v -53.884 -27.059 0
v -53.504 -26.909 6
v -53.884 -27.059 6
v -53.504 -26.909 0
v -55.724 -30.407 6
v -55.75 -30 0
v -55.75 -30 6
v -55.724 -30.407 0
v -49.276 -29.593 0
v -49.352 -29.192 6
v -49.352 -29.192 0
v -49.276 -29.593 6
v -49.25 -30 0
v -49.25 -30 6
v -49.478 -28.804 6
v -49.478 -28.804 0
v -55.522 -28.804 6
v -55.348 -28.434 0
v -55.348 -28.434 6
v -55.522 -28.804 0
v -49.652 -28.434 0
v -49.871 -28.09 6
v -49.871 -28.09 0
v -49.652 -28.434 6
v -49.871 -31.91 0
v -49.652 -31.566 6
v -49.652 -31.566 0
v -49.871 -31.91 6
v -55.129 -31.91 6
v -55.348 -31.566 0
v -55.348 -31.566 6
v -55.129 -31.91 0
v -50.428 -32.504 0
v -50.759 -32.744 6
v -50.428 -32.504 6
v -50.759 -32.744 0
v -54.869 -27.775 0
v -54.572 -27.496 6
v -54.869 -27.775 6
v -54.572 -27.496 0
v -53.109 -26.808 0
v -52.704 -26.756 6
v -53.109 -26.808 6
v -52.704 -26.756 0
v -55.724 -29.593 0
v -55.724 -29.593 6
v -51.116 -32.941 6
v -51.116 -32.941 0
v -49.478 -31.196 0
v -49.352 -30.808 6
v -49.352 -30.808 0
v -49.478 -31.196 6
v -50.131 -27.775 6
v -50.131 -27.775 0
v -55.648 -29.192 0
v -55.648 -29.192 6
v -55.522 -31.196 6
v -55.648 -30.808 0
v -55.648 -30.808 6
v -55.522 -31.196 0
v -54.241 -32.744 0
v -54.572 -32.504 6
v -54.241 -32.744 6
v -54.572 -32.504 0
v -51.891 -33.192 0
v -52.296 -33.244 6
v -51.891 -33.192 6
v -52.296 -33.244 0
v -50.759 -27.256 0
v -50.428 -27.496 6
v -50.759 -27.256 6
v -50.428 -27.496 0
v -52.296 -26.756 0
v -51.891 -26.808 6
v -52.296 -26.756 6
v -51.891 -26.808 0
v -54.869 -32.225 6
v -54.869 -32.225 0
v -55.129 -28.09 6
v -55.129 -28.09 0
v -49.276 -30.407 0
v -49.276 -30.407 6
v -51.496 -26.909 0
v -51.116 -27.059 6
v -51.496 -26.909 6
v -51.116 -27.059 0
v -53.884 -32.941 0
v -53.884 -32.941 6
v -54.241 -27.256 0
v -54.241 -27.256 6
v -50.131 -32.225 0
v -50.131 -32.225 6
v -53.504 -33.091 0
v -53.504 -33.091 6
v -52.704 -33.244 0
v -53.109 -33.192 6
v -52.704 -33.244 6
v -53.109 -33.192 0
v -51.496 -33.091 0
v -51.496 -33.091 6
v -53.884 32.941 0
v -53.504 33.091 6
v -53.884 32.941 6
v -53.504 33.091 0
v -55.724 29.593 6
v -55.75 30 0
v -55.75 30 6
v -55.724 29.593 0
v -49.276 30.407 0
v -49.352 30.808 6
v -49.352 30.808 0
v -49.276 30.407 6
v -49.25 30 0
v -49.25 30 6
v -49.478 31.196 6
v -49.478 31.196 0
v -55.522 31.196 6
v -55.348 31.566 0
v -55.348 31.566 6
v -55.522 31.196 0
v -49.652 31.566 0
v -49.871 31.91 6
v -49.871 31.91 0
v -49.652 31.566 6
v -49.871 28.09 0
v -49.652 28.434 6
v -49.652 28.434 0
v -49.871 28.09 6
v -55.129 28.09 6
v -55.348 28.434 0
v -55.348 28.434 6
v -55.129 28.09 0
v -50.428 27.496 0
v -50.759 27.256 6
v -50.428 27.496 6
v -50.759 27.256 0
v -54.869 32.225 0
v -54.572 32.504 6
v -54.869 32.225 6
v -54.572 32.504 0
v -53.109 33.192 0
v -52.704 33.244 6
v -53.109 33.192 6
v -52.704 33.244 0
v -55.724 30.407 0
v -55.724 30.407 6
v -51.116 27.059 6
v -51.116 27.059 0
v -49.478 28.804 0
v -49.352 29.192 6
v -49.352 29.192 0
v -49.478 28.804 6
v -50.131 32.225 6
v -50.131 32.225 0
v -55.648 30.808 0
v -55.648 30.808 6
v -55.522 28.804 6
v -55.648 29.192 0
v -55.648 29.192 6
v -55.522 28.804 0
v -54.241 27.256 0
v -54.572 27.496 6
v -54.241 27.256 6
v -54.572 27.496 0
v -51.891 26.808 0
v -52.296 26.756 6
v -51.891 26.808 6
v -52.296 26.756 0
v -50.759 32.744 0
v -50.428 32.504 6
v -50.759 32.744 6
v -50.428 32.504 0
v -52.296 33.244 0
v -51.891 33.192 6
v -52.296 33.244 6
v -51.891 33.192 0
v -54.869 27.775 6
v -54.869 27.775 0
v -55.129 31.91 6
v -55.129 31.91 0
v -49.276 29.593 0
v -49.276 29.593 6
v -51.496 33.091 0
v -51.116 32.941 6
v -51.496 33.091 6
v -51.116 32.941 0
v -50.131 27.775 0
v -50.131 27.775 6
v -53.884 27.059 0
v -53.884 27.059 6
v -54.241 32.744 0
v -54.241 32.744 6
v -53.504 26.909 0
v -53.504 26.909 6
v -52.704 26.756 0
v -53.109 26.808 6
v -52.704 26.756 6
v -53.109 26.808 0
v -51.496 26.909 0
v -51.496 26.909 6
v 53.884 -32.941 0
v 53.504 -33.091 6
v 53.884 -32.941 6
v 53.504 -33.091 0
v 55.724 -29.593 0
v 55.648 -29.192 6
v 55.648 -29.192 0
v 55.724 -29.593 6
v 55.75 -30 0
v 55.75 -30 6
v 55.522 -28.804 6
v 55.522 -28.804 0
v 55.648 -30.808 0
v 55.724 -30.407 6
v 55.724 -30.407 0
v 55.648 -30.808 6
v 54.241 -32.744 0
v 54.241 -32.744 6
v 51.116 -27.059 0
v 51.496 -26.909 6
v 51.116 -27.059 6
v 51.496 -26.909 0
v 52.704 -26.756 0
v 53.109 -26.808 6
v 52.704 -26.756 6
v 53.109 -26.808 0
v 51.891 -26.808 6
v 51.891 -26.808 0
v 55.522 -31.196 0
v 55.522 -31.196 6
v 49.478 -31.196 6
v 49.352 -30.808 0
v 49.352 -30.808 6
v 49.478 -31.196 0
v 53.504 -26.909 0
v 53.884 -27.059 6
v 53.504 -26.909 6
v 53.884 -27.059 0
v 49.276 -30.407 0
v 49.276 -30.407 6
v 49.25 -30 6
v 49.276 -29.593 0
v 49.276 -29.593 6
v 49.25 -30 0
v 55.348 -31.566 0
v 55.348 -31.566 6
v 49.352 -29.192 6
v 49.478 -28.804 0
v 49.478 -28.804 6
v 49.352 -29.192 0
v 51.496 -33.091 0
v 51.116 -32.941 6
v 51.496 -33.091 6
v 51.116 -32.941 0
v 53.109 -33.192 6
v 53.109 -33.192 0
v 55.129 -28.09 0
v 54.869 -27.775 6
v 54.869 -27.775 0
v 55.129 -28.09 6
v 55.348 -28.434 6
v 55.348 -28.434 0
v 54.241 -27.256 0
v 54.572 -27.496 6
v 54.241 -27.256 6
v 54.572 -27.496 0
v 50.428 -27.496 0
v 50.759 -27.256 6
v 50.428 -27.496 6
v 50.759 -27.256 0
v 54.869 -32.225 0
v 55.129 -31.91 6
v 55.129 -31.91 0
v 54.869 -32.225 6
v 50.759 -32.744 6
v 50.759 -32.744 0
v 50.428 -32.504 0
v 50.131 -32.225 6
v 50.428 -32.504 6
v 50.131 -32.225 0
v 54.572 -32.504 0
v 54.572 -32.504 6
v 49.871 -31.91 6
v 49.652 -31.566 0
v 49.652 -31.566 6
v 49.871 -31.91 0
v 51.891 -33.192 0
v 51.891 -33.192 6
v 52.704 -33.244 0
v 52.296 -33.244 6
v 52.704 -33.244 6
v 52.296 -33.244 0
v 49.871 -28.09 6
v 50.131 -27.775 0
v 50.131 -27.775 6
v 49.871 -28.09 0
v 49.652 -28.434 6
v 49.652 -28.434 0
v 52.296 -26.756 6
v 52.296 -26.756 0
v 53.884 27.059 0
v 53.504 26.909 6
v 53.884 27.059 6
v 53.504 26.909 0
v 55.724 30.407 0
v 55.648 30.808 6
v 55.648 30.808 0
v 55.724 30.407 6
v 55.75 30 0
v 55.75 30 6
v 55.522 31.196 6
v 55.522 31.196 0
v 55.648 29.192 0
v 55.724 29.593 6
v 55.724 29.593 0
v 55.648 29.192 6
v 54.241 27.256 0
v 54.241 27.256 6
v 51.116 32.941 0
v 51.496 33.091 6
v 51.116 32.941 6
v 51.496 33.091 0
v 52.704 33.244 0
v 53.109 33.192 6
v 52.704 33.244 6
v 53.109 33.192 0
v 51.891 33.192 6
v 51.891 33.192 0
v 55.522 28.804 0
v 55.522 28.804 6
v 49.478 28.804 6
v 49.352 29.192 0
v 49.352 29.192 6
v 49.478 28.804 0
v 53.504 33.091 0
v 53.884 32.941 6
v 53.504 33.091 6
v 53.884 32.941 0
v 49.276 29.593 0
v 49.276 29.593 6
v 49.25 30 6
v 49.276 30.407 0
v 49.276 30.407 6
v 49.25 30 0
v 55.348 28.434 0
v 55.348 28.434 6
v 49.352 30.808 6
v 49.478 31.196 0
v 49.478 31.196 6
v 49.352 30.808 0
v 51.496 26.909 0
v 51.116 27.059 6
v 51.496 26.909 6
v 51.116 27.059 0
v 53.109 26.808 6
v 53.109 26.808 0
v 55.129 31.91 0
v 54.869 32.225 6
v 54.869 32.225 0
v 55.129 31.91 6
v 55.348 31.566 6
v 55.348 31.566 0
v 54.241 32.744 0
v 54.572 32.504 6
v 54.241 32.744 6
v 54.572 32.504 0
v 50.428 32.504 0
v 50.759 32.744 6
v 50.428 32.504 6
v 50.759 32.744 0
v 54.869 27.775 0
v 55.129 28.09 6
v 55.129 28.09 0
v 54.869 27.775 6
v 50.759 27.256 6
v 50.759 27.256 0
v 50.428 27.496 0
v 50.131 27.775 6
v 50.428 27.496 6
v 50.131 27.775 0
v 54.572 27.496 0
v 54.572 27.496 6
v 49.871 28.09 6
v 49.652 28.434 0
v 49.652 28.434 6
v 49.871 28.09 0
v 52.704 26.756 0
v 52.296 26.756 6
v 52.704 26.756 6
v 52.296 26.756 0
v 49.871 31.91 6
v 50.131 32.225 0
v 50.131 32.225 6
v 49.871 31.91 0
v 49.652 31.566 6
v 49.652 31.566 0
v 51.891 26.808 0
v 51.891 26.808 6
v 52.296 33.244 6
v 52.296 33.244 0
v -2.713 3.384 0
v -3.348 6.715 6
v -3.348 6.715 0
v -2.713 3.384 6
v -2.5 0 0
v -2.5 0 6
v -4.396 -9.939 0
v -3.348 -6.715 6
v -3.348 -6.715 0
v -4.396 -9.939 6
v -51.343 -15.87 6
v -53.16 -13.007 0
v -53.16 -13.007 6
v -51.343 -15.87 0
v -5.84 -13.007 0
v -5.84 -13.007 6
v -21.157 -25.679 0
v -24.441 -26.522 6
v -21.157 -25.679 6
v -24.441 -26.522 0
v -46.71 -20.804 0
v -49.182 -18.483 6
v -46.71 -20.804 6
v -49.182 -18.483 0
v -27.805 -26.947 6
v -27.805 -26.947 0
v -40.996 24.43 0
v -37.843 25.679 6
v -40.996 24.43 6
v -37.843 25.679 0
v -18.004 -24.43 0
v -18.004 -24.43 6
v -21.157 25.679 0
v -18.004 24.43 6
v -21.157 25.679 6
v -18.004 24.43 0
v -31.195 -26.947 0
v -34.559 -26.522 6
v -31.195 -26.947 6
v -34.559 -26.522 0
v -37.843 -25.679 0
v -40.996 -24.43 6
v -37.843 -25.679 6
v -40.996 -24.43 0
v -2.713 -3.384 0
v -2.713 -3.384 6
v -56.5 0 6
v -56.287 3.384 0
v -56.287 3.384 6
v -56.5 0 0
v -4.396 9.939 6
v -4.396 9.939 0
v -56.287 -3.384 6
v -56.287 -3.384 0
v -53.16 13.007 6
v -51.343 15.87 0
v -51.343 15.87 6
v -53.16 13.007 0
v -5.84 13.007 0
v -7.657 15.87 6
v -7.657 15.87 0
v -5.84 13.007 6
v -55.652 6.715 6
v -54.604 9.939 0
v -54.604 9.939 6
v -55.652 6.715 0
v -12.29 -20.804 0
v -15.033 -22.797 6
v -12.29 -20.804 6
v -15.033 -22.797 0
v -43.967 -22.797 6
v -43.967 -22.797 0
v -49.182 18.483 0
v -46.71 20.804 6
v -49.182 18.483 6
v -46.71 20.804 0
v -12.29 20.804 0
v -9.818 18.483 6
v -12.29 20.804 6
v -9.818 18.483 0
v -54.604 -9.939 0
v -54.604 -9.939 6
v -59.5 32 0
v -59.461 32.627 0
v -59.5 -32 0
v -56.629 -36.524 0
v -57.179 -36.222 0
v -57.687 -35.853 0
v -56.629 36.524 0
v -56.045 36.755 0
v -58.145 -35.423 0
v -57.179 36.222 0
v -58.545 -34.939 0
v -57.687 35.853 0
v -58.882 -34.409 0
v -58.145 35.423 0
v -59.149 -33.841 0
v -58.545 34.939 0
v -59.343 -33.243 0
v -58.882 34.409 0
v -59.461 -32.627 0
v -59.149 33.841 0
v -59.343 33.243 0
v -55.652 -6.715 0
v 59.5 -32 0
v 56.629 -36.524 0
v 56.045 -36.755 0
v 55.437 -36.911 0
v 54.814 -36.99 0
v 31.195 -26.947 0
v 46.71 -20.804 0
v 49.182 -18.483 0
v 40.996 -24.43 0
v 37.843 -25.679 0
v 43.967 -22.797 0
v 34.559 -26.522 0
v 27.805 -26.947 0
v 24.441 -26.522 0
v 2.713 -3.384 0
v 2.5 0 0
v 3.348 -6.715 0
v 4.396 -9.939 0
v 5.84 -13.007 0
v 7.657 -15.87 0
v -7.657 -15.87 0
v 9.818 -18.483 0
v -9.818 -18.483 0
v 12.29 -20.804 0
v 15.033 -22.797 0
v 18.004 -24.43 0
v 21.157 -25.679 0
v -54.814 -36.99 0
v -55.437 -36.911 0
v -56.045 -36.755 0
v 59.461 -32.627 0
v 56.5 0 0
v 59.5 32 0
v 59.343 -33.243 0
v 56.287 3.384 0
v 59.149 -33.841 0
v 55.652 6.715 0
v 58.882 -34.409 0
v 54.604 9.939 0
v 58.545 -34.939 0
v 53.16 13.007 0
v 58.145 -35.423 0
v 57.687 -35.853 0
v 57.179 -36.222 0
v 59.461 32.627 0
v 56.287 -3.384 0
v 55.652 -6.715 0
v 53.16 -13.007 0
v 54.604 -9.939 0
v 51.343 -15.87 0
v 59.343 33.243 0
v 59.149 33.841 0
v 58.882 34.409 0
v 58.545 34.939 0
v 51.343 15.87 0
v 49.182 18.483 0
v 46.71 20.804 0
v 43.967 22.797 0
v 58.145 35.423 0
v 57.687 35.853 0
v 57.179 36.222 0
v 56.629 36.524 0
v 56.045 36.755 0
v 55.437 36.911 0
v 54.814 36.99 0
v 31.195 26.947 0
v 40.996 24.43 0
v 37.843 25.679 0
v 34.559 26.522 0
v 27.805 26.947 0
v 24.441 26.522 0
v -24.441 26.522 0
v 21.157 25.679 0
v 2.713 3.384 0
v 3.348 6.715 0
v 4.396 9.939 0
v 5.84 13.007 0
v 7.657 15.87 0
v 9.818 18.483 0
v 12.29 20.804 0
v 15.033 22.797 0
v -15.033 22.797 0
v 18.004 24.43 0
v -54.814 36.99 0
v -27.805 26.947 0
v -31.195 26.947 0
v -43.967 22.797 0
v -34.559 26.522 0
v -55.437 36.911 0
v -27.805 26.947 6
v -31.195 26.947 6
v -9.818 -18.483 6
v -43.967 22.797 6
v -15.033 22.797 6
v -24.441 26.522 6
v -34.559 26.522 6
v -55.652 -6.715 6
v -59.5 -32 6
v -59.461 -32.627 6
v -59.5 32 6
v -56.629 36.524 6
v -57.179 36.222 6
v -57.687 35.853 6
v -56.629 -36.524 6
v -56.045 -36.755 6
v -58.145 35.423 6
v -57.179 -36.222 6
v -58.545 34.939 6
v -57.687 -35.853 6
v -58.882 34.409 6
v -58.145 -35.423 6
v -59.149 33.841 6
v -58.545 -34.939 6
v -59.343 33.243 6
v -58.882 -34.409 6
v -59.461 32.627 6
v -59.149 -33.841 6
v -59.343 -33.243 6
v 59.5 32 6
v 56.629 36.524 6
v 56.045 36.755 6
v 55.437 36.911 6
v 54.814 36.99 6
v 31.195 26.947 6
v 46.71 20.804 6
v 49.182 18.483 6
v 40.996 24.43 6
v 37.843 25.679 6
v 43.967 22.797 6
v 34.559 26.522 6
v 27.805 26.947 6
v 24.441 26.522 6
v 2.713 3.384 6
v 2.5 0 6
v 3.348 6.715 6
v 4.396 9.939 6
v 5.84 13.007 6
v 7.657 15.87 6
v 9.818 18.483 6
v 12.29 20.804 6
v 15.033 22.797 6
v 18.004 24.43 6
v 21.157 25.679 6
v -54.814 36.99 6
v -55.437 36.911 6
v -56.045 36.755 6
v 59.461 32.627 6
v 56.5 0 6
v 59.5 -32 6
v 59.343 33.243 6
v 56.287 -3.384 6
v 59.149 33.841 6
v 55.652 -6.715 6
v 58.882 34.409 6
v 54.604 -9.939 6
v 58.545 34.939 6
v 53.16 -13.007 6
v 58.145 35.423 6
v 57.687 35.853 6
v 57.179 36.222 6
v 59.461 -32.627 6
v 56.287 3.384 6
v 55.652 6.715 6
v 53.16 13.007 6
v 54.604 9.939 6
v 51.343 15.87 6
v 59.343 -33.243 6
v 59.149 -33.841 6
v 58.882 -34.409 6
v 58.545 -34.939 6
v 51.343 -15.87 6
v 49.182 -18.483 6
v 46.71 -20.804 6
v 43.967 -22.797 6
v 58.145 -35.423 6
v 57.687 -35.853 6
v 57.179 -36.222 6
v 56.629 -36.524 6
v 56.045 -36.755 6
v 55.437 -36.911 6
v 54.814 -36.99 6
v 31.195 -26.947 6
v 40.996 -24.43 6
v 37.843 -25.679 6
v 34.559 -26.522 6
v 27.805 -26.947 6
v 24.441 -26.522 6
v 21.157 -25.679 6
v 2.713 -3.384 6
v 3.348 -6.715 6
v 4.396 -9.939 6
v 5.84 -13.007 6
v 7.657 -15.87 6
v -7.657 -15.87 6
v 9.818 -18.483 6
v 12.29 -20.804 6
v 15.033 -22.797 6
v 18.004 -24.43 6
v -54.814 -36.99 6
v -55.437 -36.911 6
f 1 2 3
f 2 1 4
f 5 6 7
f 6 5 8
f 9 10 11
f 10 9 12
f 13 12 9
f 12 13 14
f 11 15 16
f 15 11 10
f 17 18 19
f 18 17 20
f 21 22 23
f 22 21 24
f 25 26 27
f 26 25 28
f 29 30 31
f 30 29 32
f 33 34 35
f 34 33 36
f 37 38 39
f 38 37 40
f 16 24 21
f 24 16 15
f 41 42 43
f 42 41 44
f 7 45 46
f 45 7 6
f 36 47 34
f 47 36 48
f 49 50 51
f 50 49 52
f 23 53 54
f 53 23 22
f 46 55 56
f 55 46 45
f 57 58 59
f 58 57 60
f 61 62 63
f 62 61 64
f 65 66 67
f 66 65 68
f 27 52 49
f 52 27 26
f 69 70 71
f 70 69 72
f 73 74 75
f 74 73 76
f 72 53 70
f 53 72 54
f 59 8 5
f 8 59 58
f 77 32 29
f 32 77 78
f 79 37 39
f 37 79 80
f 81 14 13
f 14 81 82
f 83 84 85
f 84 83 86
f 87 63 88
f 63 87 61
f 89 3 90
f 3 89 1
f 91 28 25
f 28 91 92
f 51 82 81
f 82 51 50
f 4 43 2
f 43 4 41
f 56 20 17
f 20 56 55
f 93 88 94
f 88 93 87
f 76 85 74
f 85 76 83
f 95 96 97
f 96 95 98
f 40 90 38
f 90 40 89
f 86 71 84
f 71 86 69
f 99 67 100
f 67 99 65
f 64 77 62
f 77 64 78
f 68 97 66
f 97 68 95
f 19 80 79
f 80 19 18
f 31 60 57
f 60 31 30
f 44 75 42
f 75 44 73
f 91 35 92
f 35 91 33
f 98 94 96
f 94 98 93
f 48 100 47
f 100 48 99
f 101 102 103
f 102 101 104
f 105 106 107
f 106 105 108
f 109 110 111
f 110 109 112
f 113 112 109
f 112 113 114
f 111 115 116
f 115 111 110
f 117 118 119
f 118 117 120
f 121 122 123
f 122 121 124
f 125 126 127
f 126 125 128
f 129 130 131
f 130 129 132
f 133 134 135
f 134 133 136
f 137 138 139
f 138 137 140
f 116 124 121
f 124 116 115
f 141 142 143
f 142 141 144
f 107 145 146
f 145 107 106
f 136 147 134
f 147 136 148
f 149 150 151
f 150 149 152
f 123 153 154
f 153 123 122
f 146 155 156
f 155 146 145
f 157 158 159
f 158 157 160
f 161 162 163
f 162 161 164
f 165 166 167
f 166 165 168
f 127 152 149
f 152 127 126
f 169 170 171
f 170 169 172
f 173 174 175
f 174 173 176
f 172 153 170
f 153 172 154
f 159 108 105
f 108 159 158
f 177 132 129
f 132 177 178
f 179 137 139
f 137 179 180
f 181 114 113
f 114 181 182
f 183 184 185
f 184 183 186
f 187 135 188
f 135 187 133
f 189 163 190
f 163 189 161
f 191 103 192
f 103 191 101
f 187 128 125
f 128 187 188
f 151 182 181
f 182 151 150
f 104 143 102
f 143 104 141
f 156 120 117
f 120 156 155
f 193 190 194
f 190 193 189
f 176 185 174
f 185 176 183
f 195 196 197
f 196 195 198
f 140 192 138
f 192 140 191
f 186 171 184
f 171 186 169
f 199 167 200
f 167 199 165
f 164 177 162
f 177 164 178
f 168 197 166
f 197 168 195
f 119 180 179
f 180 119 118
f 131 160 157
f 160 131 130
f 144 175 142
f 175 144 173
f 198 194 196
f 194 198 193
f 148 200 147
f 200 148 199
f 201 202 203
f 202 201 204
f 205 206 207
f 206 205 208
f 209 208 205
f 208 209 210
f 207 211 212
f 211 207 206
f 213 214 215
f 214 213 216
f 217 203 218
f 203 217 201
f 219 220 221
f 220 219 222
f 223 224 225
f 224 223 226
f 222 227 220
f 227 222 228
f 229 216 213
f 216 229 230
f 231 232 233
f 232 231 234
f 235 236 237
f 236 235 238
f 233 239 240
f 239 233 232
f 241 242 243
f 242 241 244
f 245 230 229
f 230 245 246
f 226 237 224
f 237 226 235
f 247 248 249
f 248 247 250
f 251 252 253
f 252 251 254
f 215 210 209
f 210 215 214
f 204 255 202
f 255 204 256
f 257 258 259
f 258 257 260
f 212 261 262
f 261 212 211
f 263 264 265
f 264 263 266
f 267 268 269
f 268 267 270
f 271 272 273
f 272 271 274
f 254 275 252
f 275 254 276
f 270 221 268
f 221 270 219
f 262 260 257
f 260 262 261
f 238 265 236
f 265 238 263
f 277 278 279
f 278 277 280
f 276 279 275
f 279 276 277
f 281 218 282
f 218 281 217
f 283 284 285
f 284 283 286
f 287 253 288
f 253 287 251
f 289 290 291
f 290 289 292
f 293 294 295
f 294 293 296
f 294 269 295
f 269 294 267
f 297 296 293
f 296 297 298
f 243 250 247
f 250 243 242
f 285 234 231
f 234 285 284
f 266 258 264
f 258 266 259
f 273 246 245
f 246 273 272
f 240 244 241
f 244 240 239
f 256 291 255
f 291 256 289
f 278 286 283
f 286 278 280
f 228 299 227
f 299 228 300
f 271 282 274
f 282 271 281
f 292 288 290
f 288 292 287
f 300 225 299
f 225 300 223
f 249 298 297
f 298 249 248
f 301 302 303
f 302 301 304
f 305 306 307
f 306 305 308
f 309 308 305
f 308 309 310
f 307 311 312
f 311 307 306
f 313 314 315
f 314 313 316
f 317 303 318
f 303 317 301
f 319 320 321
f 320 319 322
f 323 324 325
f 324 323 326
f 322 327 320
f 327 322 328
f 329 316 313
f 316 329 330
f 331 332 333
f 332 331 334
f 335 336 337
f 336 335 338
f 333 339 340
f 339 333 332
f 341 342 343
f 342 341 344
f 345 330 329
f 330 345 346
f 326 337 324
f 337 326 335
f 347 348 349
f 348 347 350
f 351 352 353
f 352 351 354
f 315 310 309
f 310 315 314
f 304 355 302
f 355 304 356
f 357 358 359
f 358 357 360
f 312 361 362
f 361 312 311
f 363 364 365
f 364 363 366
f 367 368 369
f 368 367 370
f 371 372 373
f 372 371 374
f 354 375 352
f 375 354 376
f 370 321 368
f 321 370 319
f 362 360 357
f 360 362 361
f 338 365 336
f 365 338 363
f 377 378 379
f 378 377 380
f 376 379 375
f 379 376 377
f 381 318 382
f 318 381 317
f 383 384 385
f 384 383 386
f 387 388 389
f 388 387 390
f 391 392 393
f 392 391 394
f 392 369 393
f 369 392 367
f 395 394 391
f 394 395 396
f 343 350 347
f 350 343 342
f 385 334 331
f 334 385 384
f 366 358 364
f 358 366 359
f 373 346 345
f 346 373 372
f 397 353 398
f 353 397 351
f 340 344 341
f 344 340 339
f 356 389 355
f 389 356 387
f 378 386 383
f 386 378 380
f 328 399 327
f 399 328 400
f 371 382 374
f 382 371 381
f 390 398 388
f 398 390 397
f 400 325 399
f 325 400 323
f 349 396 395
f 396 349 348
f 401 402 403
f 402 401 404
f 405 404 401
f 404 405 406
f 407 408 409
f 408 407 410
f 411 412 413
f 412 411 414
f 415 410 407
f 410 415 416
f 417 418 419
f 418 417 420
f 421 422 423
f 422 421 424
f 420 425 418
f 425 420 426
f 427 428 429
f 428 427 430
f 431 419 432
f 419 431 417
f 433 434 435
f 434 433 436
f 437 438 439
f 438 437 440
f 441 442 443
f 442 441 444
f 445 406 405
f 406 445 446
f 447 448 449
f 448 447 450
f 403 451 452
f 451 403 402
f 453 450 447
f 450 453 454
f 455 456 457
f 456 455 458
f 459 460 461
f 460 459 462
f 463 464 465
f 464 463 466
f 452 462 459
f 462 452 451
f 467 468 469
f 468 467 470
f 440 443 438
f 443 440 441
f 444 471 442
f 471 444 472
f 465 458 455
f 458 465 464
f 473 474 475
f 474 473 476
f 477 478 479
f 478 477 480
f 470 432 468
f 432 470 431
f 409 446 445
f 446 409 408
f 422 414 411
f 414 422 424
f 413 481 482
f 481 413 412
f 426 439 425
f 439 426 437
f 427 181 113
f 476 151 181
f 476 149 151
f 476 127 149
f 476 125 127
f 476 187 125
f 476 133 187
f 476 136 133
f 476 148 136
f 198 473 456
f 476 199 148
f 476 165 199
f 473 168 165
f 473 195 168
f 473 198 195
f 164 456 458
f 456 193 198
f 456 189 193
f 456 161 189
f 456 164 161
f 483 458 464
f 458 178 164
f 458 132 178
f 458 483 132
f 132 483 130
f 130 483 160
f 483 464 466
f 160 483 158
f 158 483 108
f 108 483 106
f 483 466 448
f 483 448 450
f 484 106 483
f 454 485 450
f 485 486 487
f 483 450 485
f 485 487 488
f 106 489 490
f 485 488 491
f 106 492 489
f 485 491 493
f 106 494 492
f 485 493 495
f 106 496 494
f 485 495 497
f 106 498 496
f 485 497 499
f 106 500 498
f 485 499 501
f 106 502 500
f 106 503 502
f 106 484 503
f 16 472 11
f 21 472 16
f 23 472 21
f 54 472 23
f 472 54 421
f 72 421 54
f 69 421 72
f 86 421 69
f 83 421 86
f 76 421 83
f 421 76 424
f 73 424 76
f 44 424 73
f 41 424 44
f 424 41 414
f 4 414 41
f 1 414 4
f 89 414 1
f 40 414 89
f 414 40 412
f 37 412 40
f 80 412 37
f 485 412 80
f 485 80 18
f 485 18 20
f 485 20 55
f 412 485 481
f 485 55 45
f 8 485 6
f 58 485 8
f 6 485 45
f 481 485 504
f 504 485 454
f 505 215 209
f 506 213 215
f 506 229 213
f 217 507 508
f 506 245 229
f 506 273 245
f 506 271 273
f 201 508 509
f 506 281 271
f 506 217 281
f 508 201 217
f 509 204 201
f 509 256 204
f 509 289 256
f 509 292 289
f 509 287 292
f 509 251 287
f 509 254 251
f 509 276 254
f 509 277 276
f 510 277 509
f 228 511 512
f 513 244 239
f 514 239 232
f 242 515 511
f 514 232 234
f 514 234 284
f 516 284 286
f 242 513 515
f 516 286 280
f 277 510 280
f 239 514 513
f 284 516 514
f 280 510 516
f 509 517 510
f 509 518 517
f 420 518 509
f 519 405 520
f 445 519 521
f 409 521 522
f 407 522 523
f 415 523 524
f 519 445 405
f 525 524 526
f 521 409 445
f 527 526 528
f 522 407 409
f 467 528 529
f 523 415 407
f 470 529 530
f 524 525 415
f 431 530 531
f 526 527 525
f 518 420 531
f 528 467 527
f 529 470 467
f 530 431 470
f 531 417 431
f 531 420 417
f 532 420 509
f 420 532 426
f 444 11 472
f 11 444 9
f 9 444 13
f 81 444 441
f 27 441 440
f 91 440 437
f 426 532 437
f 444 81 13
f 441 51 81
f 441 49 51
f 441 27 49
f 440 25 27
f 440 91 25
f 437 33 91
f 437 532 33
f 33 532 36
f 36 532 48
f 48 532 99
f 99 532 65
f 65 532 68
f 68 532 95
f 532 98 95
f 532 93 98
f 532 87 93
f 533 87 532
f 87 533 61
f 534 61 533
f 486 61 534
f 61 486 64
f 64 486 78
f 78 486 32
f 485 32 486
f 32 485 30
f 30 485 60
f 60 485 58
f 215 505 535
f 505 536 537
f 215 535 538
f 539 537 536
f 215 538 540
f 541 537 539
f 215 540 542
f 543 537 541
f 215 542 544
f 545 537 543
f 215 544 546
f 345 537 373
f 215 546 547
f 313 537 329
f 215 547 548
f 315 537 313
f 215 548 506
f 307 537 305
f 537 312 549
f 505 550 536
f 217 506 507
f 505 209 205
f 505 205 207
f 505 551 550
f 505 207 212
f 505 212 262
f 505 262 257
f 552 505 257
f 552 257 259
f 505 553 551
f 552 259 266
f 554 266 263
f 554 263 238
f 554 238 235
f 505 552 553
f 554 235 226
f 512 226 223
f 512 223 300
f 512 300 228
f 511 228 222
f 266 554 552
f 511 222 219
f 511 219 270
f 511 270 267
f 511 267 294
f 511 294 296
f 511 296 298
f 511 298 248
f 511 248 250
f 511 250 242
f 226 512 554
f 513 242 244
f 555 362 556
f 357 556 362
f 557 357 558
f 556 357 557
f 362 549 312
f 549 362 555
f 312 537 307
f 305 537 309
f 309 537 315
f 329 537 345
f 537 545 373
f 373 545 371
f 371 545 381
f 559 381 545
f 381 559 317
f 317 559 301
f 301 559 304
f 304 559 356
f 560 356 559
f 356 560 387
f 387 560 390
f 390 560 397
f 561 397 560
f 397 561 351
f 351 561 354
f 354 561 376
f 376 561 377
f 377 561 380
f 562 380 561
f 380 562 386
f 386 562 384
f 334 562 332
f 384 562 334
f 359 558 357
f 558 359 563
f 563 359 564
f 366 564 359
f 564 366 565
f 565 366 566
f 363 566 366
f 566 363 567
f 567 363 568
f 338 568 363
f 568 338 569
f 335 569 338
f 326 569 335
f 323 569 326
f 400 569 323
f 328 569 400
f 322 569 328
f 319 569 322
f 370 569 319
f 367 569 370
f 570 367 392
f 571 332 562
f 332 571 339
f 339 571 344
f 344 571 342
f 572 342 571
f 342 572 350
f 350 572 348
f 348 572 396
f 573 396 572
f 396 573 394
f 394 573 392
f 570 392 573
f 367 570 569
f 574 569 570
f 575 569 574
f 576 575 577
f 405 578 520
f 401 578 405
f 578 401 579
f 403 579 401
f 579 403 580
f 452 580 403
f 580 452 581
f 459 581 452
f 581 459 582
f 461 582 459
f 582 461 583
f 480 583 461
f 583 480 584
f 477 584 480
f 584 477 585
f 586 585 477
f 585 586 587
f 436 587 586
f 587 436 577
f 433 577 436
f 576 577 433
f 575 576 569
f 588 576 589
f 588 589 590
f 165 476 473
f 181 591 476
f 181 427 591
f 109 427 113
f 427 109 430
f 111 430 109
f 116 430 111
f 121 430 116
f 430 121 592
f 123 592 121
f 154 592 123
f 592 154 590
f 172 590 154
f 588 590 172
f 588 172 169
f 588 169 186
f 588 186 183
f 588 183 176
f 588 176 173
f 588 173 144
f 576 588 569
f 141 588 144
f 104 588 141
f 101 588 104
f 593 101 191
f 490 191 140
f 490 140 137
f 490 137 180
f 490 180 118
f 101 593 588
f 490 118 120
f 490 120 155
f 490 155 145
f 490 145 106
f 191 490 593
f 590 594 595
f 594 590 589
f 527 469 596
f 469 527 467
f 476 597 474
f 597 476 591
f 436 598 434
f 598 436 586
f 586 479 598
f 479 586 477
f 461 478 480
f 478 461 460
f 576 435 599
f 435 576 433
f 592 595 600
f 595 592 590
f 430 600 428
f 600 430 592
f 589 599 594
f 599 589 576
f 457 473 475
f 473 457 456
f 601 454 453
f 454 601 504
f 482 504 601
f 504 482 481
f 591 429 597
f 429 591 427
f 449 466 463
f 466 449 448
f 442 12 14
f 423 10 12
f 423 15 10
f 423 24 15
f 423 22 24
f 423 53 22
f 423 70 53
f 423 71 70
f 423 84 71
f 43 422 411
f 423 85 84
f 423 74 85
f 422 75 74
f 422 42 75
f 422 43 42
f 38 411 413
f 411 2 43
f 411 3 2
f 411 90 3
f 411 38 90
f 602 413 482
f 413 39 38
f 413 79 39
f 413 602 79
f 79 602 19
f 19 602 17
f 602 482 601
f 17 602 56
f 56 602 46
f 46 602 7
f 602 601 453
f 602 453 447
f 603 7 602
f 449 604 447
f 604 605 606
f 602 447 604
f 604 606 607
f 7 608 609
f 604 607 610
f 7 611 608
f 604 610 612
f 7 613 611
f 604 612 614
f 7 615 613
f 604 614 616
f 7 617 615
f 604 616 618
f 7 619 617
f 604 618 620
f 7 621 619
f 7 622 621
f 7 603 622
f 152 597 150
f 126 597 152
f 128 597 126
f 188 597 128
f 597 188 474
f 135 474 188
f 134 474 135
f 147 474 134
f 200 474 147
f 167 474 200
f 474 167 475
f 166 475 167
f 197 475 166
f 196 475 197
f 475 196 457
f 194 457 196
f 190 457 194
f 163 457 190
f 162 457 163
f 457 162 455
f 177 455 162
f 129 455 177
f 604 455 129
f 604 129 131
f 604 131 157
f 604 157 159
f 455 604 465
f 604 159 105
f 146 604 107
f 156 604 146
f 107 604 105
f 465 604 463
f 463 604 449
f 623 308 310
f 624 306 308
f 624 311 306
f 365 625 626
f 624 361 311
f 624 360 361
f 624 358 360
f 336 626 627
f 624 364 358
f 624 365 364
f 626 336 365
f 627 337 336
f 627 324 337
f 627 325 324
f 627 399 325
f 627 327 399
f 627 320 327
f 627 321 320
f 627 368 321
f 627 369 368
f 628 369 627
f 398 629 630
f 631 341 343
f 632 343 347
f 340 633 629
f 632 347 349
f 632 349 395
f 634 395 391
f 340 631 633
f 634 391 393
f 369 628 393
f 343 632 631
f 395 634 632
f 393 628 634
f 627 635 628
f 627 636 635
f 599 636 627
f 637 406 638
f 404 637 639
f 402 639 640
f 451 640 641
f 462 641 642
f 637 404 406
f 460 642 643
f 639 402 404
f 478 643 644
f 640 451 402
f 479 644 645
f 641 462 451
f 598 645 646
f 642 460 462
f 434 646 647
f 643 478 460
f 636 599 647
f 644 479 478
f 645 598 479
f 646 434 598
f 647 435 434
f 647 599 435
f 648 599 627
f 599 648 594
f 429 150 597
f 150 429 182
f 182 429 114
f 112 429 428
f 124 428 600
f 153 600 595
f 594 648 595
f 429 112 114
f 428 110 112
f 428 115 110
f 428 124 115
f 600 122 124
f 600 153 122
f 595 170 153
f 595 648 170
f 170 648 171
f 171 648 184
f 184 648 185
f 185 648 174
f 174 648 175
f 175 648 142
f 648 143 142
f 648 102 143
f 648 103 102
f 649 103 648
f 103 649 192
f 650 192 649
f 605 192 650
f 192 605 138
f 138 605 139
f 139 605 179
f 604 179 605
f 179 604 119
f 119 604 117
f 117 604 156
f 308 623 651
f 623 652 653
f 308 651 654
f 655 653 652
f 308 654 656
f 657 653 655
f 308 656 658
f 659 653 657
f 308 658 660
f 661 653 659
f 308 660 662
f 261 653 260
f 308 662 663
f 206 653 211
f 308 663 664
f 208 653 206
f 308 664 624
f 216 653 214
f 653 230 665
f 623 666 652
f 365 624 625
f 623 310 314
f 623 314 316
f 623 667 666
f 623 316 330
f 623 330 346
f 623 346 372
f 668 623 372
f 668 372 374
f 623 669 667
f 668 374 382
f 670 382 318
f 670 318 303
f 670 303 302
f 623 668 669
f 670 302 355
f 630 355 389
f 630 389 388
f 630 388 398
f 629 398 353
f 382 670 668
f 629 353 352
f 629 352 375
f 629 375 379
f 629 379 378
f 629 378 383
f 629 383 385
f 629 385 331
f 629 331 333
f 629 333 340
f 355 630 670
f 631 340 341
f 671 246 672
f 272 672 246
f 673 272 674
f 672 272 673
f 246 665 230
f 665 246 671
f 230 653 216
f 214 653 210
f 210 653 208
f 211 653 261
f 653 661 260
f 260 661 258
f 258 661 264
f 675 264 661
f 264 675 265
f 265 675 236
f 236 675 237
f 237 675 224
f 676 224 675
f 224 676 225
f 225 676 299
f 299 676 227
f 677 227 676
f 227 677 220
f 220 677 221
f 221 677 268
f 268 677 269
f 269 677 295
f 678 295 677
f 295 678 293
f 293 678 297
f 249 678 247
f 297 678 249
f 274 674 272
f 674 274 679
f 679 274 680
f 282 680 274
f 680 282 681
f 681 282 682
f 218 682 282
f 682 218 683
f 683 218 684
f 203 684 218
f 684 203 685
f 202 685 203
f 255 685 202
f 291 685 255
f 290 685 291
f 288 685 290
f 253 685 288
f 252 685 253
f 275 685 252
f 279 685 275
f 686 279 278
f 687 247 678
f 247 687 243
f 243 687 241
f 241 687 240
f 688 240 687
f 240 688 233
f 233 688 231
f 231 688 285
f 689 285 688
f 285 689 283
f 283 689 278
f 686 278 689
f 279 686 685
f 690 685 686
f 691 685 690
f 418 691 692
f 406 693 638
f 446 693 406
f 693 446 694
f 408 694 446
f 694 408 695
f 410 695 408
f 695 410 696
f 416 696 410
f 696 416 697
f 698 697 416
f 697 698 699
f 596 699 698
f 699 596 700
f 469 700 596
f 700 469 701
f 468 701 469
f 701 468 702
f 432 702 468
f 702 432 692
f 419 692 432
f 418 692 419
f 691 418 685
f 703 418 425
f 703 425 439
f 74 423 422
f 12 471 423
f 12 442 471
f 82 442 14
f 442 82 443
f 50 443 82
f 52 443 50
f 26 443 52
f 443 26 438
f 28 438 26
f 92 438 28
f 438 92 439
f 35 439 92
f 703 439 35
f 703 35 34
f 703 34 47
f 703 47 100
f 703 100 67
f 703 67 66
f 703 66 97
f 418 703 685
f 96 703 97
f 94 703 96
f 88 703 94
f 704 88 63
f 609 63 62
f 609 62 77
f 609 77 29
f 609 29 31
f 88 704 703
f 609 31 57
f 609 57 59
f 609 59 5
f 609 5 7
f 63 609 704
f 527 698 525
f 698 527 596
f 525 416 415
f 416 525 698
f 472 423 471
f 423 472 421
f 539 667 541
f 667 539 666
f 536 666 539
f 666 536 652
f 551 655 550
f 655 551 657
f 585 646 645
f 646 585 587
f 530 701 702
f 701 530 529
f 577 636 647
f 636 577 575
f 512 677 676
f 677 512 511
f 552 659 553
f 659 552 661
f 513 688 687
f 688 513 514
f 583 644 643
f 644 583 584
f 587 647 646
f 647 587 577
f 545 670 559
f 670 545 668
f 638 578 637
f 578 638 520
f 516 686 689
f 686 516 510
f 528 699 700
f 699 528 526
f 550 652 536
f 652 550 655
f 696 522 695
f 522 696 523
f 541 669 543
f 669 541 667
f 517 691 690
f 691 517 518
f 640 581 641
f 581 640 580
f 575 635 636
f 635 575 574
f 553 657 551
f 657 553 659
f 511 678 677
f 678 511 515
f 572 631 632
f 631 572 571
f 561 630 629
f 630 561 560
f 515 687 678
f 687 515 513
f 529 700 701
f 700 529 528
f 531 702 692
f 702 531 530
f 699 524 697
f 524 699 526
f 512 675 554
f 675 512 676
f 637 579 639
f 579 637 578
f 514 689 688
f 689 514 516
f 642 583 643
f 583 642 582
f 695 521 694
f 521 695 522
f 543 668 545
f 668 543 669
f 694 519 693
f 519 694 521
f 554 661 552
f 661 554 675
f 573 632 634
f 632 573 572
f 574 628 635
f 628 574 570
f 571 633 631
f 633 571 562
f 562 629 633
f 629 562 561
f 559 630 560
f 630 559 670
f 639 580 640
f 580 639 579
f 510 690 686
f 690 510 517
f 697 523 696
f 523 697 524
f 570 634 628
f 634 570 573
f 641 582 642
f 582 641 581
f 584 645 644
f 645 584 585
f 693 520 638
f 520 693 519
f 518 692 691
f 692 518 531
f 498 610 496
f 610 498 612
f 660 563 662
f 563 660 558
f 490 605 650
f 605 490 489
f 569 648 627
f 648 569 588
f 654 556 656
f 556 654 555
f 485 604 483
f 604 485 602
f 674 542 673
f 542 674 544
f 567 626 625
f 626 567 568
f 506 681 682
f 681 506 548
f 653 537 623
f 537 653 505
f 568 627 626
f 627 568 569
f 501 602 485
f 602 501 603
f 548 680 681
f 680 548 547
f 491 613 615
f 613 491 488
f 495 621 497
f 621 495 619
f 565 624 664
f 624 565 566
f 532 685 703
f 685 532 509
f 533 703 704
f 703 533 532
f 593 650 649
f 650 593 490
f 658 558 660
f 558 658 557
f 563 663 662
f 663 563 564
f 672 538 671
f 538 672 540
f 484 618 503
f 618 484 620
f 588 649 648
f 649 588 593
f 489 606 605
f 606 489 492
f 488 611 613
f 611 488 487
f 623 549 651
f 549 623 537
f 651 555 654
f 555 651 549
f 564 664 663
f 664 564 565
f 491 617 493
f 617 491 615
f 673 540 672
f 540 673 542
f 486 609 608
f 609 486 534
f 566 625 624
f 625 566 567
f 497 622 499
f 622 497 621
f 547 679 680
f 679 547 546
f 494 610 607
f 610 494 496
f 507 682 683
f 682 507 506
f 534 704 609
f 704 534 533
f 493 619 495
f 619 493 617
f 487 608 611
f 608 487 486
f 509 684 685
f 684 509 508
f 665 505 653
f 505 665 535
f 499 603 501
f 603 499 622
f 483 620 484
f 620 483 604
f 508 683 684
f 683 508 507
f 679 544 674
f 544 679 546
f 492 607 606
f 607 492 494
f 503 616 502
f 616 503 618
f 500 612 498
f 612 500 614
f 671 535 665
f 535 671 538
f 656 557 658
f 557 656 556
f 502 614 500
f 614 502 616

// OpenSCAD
$fn = 50;


difference() {
	union() {
		hull() {
			translate(v = [-54.5000000000, 32.0000000000, 0]) {
				cylinder(h = 6, r = 5);
			}
			translate(v = [54.5000000000, 32.0000000000, 0]) {
				cylinder(h = 6, r = 5);
			}
			translate(v = [-54.5000000000, -32.0000000000, 0]) {
				cylinder(h = 6, r = 5);
			}
			translate(v = [54.5000000000, -32.0000000000, 0]) {
				cylinder(h = 6, r = 5);
			}
		}
	}
	union() {
		#translate(v = [-52.5000000000, -30.0000000000, -100.0000000000]) {
			cylinder(h = 200, r = 3.2500000000);
		}
		#translate(v = [-52.5000000000, 30.0000000000, -100.0000000000]) {
			cylinder(h = 200, r = 3.2500000000);
		}
		#translate(v = [52.5000000000, -30.0000000000, -100.0000000000]) {
			cylinder(h = 200, r = 3.2500000000);
		}
		#translate(v = [52.5000000000, 30.0000000000, -100.0000000000]) {
			cylinder(h = 200, r = 3.2500000000);
		}
		#translate(v = [-29.5000000000, 0, 0]) {
			cylinder(h = 6, r = 27.0000000000);
		}
		#translate(v = [29.5000000000, 0, 0]) {
			cylinder(h = 6, r = 27.0000000000);
		}
	}
}
